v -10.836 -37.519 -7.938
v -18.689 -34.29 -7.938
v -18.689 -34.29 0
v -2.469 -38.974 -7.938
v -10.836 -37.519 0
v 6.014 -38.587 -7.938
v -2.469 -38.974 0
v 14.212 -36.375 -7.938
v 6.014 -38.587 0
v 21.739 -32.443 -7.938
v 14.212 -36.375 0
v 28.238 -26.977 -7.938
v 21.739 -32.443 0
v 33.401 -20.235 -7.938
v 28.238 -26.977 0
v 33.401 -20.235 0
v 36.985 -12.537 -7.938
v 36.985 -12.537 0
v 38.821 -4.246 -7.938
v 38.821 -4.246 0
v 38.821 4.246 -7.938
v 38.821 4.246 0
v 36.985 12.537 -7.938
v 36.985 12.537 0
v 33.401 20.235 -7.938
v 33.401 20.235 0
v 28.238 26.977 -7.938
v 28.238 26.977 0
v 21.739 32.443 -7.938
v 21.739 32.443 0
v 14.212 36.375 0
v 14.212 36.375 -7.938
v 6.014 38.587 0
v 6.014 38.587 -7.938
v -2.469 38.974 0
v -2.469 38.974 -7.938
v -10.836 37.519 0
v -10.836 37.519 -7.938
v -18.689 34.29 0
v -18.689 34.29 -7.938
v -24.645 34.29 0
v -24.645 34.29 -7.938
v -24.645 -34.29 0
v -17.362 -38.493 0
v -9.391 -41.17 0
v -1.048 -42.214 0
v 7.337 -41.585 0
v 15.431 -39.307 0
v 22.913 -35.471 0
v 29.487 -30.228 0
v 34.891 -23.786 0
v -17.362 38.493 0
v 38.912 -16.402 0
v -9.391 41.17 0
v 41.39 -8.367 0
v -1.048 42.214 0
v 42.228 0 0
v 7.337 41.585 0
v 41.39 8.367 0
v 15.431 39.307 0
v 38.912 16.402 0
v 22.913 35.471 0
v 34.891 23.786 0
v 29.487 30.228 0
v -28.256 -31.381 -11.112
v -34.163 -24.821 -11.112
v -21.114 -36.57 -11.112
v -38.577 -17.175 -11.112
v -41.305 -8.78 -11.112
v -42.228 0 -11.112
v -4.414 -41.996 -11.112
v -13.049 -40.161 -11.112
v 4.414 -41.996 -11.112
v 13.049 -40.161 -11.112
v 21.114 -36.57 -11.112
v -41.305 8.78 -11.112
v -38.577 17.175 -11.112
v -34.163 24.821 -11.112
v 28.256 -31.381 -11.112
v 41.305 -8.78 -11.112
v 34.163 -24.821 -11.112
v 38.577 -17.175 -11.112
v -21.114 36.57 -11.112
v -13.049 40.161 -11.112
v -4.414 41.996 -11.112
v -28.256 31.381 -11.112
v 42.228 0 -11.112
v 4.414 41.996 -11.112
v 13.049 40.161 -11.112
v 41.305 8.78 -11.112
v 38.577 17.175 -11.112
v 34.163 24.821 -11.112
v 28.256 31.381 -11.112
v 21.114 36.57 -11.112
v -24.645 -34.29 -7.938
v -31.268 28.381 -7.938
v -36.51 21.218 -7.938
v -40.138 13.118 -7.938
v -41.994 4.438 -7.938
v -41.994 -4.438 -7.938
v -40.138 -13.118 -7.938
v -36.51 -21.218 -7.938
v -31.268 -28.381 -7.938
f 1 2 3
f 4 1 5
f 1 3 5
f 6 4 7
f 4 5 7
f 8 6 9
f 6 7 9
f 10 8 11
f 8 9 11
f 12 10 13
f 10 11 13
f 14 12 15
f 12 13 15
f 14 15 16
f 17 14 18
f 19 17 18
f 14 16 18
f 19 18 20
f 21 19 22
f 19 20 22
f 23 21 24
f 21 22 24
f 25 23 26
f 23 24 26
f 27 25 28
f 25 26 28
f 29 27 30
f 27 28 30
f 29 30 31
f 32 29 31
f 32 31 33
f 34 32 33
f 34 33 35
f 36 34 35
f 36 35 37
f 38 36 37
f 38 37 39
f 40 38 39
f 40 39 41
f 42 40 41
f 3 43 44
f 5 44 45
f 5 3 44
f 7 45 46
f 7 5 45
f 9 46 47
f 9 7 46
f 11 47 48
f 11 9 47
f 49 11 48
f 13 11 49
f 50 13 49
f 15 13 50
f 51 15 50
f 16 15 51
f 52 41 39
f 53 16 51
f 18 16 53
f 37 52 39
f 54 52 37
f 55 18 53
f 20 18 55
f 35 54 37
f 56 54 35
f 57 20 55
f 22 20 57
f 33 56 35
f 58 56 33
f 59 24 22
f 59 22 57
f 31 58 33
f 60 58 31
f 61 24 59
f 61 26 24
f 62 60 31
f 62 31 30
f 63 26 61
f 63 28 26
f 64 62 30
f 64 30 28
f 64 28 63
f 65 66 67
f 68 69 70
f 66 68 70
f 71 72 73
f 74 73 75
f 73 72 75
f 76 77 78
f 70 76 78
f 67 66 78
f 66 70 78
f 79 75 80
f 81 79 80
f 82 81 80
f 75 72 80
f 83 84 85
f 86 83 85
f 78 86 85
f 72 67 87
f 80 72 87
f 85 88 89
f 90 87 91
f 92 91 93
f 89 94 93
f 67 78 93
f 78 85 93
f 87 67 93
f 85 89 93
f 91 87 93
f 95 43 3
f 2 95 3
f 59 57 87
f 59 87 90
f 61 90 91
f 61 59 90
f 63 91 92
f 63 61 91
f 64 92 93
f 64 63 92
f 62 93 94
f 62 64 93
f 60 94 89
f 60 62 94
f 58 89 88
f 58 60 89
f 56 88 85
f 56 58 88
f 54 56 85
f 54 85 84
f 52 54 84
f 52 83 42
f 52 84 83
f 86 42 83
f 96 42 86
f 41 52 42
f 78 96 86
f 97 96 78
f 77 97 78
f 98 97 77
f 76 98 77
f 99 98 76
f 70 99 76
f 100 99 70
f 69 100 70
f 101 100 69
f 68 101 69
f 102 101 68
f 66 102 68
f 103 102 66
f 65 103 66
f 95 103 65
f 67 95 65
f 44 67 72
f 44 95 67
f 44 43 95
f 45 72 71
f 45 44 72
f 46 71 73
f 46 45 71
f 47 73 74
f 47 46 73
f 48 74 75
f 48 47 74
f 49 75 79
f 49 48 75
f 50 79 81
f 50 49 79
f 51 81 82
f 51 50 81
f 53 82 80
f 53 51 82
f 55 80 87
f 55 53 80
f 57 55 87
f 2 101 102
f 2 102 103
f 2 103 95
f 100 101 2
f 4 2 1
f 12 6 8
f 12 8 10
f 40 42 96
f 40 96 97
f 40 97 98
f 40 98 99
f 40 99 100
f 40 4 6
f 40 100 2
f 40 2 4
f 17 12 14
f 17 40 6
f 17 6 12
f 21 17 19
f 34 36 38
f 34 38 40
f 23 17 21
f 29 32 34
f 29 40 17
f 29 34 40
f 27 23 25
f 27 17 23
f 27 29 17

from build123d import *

# Parameters (mm, degrees)
F2_R        = 42.2275
F0_DEPTH    = 11.1125
F3_T        = -3.175
F0_FACE_R   = 42.2275
F0_FACE_R_2 = 39.0525
F4_DEPTH    = 25.4


with BuildPart() as f0:
    # F2 (on Top) → F0 (new body)
    with BuildSketch(Plane.XY):
        Circle(F2_R)
    extrude(amount=-F0_DEPTH)

    # F3
    f3_openings = [f0.faces().sort_by_distance(p)[0] for p in [
        (0, 0, 0),
    ]]
    offset(amount=F3_T, openings=f3_openings)

    # F1 (on face) + F0_face (on face) → F4 (cut)
    with BuildSketch(Plane.XY.offset(-7.9375)):
        with BuildLine():
            ThreePointArc((-18.689399569, -34.29), (-39.0525, 0), (-18.689399569, 34.29))
            Line((-18.689399569, 34.29), (-44.45, 34.29))
            Line((-44.45, 34.29), (-44.45, -34.29))
            Line((-44.45, -34.29), (-18.689399569, -34.29))
        make_face()
        with BuildLine():
            ThreePointArc((-5.9242471252, -34.29), (-34.798, 0), (-5.9242471252, 34.29))
            Line((-5.9242471252, 34.29), (-18.689399569, 34.29))
            ThreePointArc((-18.689399569, 34.29), (-39.0525, 0), (-18.689399569, -34.29))
            Line((-18.689399569, -34.29), (-5.9242471252, -34.29))
        make_face()
        with BuildLine():
            Line((0, 34.29), (-5.9242471252, 34.29))
            ThreePointArc((-5.9242471252, 34.29), (-34.798, 0), (-5.9242471252, -34.29))
            Line((-5.9242471252, -34.29), (0, -34.29))
            ThreePointArc((0, -34.29), (-34.29, 0), (0, 34.29))
        make_face()
    with BuildSketch(Plane.XY):
        Circle(F0_FACE_R)
        Circle(F0_FACE_R_2, mode=Mode.SUBTRACT)
    extrude(amount=F4_DEPTH, mode=Mode.SUBTRACT)


solid = f0.part
